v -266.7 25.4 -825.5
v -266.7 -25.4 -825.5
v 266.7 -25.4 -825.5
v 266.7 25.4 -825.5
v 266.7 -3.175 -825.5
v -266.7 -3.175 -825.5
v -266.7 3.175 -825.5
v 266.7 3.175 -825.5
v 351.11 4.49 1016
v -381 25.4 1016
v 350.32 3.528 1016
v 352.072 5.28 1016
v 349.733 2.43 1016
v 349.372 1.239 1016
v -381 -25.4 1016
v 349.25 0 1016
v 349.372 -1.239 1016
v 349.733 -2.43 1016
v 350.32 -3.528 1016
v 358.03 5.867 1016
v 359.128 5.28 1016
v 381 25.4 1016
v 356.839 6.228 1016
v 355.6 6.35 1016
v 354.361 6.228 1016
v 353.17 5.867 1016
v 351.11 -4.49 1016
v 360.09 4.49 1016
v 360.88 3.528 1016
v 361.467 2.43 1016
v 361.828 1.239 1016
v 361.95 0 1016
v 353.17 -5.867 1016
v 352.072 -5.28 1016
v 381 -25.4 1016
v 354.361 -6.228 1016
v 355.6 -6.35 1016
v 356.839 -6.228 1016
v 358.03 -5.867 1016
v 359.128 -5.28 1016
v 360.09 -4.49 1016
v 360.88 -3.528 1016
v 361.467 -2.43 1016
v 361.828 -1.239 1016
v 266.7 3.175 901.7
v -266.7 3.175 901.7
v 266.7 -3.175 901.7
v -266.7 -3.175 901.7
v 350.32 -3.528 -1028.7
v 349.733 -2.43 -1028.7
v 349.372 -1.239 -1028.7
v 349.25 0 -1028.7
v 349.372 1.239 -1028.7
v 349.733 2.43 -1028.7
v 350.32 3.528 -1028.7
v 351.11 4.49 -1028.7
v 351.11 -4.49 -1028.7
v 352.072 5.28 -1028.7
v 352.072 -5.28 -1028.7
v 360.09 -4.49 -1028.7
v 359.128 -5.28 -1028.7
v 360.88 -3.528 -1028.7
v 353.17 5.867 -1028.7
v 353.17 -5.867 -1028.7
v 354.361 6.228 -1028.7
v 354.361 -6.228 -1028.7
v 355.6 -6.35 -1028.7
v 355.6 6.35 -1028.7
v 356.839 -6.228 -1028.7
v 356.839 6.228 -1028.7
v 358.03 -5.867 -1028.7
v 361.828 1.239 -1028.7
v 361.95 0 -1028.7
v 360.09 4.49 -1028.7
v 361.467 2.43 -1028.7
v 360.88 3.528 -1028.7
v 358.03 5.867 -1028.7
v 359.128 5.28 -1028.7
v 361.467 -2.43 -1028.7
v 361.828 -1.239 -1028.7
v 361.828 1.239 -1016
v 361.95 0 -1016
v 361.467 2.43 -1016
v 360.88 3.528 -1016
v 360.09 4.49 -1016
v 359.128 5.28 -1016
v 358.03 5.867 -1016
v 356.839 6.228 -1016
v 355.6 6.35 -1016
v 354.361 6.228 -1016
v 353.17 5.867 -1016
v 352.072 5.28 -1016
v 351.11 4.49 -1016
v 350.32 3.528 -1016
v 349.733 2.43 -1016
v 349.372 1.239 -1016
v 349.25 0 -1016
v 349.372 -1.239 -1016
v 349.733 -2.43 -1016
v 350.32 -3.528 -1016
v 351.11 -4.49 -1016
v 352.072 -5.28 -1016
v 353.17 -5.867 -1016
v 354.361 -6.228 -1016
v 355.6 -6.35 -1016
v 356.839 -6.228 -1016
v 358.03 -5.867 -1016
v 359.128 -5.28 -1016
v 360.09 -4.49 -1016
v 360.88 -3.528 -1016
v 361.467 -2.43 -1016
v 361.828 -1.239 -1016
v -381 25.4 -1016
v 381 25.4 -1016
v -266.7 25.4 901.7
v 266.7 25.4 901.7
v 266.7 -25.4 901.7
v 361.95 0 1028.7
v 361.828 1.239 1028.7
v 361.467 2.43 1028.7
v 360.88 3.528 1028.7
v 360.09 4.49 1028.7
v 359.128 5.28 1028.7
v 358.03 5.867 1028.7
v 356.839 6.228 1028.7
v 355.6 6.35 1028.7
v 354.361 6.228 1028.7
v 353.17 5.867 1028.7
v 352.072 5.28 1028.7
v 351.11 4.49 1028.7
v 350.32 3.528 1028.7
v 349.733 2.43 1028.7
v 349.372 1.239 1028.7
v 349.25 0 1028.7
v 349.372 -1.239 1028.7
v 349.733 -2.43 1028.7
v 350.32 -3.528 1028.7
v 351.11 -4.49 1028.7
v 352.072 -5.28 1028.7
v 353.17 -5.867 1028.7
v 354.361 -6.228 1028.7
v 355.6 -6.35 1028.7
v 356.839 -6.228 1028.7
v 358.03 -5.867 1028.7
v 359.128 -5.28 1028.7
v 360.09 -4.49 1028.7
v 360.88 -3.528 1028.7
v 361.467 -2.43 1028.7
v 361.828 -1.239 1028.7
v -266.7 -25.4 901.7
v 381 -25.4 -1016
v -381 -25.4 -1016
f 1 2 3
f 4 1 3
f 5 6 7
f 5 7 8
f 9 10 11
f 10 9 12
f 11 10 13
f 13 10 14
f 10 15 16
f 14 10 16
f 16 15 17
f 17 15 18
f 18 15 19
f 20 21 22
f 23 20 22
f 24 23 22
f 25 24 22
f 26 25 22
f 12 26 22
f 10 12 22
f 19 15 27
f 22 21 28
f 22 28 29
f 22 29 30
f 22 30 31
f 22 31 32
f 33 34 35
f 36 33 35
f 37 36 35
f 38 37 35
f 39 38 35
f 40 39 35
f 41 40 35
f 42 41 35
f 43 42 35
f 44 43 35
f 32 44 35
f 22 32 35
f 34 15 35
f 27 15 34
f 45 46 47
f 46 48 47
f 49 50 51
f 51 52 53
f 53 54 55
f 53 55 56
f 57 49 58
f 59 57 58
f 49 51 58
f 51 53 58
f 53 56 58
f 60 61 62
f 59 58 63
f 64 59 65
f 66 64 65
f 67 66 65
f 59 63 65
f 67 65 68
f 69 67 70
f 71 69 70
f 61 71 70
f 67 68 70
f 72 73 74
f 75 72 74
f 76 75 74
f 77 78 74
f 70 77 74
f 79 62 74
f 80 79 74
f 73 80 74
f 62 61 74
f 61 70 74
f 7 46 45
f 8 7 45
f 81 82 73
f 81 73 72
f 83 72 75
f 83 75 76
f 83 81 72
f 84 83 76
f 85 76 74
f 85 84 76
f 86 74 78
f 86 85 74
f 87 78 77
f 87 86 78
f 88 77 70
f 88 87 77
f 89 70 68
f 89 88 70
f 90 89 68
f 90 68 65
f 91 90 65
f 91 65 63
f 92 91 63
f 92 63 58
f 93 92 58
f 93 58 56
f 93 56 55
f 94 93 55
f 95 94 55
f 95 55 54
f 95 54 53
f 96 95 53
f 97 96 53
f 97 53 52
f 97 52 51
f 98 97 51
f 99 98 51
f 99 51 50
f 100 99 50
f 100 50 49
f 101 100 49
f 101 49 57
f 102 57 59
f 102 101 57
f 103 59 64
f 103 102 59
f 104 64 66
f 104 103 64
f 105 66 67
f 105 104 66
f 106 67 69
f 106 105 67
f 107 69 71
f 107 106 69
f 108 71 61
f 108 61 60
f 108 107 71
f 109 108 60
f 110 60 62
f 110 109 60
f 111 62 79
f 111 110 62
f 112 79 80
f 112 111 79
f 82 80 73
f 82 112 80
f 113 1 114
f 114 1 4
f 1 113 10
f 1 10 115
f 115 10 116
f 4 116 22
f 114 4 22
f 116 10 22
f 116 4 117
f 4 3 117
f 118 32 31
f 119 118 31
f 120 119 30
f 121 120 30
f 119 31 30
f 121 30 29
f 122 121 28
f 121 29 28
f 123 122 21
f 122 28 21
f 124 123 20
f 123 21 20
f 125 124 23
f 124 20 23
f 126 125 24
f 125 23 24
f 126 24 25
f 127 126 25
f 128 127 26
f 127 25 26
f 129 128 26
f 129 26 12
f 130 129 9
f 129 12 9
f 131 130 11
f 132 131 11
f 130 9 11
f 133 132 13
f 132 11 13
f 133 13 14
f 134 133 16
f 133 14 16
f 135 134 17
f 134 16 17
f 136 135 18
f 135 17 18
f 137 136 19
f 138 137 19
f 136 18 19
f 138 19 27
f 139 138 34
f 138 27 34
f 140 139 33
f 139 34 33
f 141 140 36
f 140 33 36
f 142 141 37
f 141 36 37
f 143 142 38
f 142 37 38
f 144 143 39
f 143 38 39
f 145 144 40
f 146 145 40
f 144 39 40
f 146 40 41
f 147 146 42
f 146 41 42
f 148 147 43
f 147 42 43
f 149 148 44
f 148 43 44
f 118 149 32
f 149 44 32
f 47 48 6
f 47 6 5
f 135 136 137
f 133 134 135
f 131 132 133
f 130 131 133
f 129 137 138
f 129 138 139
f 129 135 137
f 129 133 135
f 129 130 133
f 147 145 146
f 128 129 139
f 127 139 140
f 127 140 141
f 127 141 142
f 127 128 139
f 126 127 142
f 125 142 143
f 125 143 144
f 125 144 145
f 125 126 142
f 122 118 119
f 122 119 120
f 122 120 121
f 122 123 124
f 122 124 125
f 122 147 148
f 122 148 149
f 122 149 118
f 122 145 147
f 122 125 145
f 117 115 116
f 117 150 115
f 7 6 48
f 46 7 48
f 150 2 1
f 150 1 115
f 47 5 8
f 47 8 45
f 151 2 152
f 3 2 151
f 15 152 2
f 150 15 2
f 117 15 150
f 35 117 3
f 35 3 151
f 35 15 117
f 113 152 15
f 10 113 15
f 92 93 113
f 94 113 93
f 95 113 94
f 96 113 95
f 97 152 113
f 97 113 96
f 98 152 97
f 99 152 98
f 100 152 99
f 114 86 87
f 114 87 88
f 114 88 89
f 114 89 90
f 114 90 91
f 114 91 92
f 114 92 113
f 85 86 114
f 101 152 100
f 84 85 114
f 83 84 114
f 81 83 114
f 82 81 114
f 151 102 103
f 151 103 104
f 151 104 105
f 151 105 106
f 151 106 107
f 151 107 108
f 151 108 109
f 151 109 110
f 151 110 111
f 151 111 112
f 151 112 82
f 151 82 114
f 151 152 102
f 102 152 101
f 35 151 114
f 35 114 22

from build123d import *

# Parameters (mm, degrees)
F0_W          = 762
F0_H          = 2032
F0_W_2        = 533.4
F0_H_2        = 1727.2
F1_DEPTH      = 25.4
F1_DEPTH_BACK = 25.4
F2_DEPTH      = 3.175
F2_DEPTH_BACK = 3.175
F3_R          = 6.35
F4_DEPTH      = 12.7
F4_DEPTH_BACK = 2044.7


with BuildPart() as f1:
    # F0 (on Front) → F1 (new body, two sides)
    with BuildSketch(Plane.XZ) as f1_sk:
        Rectangle(F0_W, F0_H)
        with Locations((0, 38.1)):
            Rectangle(F0_W_2, F0_H_2, mode=Mode.SUBTRACT)
    extrude(amount=F1_DEPTH)
    extrude(f1_sk.sketch, amount=-F1_DEPTH_BACK)

    # F3 (on face) → F4 (join, two sides)
    with BuildSketch(Plane.XY.offset(1016)) as f4_sk:
        with Locations((355.6, 0)):
            Circle(F3_R)
    extrude(amount=F4_DEPTH)
    extrude(f4_sk.sketch, amount=-F4_DEPTH_BACK)


with BuildPart() as f2:
    # F0 (on Front) → F2 (new body, two sides)
    with BuildSketch(Plane.XZ) as f2_sk:
        with Locations((0, 38.1)):
            Rectangle(F0_W_2, F0_H_2)
    extrude(amount=F2_DEPTH)
    extrude(f2_sk.sketch, amount=-F2_DEPTH_BACK)


solid = Compound([f1.part, f2.part])
